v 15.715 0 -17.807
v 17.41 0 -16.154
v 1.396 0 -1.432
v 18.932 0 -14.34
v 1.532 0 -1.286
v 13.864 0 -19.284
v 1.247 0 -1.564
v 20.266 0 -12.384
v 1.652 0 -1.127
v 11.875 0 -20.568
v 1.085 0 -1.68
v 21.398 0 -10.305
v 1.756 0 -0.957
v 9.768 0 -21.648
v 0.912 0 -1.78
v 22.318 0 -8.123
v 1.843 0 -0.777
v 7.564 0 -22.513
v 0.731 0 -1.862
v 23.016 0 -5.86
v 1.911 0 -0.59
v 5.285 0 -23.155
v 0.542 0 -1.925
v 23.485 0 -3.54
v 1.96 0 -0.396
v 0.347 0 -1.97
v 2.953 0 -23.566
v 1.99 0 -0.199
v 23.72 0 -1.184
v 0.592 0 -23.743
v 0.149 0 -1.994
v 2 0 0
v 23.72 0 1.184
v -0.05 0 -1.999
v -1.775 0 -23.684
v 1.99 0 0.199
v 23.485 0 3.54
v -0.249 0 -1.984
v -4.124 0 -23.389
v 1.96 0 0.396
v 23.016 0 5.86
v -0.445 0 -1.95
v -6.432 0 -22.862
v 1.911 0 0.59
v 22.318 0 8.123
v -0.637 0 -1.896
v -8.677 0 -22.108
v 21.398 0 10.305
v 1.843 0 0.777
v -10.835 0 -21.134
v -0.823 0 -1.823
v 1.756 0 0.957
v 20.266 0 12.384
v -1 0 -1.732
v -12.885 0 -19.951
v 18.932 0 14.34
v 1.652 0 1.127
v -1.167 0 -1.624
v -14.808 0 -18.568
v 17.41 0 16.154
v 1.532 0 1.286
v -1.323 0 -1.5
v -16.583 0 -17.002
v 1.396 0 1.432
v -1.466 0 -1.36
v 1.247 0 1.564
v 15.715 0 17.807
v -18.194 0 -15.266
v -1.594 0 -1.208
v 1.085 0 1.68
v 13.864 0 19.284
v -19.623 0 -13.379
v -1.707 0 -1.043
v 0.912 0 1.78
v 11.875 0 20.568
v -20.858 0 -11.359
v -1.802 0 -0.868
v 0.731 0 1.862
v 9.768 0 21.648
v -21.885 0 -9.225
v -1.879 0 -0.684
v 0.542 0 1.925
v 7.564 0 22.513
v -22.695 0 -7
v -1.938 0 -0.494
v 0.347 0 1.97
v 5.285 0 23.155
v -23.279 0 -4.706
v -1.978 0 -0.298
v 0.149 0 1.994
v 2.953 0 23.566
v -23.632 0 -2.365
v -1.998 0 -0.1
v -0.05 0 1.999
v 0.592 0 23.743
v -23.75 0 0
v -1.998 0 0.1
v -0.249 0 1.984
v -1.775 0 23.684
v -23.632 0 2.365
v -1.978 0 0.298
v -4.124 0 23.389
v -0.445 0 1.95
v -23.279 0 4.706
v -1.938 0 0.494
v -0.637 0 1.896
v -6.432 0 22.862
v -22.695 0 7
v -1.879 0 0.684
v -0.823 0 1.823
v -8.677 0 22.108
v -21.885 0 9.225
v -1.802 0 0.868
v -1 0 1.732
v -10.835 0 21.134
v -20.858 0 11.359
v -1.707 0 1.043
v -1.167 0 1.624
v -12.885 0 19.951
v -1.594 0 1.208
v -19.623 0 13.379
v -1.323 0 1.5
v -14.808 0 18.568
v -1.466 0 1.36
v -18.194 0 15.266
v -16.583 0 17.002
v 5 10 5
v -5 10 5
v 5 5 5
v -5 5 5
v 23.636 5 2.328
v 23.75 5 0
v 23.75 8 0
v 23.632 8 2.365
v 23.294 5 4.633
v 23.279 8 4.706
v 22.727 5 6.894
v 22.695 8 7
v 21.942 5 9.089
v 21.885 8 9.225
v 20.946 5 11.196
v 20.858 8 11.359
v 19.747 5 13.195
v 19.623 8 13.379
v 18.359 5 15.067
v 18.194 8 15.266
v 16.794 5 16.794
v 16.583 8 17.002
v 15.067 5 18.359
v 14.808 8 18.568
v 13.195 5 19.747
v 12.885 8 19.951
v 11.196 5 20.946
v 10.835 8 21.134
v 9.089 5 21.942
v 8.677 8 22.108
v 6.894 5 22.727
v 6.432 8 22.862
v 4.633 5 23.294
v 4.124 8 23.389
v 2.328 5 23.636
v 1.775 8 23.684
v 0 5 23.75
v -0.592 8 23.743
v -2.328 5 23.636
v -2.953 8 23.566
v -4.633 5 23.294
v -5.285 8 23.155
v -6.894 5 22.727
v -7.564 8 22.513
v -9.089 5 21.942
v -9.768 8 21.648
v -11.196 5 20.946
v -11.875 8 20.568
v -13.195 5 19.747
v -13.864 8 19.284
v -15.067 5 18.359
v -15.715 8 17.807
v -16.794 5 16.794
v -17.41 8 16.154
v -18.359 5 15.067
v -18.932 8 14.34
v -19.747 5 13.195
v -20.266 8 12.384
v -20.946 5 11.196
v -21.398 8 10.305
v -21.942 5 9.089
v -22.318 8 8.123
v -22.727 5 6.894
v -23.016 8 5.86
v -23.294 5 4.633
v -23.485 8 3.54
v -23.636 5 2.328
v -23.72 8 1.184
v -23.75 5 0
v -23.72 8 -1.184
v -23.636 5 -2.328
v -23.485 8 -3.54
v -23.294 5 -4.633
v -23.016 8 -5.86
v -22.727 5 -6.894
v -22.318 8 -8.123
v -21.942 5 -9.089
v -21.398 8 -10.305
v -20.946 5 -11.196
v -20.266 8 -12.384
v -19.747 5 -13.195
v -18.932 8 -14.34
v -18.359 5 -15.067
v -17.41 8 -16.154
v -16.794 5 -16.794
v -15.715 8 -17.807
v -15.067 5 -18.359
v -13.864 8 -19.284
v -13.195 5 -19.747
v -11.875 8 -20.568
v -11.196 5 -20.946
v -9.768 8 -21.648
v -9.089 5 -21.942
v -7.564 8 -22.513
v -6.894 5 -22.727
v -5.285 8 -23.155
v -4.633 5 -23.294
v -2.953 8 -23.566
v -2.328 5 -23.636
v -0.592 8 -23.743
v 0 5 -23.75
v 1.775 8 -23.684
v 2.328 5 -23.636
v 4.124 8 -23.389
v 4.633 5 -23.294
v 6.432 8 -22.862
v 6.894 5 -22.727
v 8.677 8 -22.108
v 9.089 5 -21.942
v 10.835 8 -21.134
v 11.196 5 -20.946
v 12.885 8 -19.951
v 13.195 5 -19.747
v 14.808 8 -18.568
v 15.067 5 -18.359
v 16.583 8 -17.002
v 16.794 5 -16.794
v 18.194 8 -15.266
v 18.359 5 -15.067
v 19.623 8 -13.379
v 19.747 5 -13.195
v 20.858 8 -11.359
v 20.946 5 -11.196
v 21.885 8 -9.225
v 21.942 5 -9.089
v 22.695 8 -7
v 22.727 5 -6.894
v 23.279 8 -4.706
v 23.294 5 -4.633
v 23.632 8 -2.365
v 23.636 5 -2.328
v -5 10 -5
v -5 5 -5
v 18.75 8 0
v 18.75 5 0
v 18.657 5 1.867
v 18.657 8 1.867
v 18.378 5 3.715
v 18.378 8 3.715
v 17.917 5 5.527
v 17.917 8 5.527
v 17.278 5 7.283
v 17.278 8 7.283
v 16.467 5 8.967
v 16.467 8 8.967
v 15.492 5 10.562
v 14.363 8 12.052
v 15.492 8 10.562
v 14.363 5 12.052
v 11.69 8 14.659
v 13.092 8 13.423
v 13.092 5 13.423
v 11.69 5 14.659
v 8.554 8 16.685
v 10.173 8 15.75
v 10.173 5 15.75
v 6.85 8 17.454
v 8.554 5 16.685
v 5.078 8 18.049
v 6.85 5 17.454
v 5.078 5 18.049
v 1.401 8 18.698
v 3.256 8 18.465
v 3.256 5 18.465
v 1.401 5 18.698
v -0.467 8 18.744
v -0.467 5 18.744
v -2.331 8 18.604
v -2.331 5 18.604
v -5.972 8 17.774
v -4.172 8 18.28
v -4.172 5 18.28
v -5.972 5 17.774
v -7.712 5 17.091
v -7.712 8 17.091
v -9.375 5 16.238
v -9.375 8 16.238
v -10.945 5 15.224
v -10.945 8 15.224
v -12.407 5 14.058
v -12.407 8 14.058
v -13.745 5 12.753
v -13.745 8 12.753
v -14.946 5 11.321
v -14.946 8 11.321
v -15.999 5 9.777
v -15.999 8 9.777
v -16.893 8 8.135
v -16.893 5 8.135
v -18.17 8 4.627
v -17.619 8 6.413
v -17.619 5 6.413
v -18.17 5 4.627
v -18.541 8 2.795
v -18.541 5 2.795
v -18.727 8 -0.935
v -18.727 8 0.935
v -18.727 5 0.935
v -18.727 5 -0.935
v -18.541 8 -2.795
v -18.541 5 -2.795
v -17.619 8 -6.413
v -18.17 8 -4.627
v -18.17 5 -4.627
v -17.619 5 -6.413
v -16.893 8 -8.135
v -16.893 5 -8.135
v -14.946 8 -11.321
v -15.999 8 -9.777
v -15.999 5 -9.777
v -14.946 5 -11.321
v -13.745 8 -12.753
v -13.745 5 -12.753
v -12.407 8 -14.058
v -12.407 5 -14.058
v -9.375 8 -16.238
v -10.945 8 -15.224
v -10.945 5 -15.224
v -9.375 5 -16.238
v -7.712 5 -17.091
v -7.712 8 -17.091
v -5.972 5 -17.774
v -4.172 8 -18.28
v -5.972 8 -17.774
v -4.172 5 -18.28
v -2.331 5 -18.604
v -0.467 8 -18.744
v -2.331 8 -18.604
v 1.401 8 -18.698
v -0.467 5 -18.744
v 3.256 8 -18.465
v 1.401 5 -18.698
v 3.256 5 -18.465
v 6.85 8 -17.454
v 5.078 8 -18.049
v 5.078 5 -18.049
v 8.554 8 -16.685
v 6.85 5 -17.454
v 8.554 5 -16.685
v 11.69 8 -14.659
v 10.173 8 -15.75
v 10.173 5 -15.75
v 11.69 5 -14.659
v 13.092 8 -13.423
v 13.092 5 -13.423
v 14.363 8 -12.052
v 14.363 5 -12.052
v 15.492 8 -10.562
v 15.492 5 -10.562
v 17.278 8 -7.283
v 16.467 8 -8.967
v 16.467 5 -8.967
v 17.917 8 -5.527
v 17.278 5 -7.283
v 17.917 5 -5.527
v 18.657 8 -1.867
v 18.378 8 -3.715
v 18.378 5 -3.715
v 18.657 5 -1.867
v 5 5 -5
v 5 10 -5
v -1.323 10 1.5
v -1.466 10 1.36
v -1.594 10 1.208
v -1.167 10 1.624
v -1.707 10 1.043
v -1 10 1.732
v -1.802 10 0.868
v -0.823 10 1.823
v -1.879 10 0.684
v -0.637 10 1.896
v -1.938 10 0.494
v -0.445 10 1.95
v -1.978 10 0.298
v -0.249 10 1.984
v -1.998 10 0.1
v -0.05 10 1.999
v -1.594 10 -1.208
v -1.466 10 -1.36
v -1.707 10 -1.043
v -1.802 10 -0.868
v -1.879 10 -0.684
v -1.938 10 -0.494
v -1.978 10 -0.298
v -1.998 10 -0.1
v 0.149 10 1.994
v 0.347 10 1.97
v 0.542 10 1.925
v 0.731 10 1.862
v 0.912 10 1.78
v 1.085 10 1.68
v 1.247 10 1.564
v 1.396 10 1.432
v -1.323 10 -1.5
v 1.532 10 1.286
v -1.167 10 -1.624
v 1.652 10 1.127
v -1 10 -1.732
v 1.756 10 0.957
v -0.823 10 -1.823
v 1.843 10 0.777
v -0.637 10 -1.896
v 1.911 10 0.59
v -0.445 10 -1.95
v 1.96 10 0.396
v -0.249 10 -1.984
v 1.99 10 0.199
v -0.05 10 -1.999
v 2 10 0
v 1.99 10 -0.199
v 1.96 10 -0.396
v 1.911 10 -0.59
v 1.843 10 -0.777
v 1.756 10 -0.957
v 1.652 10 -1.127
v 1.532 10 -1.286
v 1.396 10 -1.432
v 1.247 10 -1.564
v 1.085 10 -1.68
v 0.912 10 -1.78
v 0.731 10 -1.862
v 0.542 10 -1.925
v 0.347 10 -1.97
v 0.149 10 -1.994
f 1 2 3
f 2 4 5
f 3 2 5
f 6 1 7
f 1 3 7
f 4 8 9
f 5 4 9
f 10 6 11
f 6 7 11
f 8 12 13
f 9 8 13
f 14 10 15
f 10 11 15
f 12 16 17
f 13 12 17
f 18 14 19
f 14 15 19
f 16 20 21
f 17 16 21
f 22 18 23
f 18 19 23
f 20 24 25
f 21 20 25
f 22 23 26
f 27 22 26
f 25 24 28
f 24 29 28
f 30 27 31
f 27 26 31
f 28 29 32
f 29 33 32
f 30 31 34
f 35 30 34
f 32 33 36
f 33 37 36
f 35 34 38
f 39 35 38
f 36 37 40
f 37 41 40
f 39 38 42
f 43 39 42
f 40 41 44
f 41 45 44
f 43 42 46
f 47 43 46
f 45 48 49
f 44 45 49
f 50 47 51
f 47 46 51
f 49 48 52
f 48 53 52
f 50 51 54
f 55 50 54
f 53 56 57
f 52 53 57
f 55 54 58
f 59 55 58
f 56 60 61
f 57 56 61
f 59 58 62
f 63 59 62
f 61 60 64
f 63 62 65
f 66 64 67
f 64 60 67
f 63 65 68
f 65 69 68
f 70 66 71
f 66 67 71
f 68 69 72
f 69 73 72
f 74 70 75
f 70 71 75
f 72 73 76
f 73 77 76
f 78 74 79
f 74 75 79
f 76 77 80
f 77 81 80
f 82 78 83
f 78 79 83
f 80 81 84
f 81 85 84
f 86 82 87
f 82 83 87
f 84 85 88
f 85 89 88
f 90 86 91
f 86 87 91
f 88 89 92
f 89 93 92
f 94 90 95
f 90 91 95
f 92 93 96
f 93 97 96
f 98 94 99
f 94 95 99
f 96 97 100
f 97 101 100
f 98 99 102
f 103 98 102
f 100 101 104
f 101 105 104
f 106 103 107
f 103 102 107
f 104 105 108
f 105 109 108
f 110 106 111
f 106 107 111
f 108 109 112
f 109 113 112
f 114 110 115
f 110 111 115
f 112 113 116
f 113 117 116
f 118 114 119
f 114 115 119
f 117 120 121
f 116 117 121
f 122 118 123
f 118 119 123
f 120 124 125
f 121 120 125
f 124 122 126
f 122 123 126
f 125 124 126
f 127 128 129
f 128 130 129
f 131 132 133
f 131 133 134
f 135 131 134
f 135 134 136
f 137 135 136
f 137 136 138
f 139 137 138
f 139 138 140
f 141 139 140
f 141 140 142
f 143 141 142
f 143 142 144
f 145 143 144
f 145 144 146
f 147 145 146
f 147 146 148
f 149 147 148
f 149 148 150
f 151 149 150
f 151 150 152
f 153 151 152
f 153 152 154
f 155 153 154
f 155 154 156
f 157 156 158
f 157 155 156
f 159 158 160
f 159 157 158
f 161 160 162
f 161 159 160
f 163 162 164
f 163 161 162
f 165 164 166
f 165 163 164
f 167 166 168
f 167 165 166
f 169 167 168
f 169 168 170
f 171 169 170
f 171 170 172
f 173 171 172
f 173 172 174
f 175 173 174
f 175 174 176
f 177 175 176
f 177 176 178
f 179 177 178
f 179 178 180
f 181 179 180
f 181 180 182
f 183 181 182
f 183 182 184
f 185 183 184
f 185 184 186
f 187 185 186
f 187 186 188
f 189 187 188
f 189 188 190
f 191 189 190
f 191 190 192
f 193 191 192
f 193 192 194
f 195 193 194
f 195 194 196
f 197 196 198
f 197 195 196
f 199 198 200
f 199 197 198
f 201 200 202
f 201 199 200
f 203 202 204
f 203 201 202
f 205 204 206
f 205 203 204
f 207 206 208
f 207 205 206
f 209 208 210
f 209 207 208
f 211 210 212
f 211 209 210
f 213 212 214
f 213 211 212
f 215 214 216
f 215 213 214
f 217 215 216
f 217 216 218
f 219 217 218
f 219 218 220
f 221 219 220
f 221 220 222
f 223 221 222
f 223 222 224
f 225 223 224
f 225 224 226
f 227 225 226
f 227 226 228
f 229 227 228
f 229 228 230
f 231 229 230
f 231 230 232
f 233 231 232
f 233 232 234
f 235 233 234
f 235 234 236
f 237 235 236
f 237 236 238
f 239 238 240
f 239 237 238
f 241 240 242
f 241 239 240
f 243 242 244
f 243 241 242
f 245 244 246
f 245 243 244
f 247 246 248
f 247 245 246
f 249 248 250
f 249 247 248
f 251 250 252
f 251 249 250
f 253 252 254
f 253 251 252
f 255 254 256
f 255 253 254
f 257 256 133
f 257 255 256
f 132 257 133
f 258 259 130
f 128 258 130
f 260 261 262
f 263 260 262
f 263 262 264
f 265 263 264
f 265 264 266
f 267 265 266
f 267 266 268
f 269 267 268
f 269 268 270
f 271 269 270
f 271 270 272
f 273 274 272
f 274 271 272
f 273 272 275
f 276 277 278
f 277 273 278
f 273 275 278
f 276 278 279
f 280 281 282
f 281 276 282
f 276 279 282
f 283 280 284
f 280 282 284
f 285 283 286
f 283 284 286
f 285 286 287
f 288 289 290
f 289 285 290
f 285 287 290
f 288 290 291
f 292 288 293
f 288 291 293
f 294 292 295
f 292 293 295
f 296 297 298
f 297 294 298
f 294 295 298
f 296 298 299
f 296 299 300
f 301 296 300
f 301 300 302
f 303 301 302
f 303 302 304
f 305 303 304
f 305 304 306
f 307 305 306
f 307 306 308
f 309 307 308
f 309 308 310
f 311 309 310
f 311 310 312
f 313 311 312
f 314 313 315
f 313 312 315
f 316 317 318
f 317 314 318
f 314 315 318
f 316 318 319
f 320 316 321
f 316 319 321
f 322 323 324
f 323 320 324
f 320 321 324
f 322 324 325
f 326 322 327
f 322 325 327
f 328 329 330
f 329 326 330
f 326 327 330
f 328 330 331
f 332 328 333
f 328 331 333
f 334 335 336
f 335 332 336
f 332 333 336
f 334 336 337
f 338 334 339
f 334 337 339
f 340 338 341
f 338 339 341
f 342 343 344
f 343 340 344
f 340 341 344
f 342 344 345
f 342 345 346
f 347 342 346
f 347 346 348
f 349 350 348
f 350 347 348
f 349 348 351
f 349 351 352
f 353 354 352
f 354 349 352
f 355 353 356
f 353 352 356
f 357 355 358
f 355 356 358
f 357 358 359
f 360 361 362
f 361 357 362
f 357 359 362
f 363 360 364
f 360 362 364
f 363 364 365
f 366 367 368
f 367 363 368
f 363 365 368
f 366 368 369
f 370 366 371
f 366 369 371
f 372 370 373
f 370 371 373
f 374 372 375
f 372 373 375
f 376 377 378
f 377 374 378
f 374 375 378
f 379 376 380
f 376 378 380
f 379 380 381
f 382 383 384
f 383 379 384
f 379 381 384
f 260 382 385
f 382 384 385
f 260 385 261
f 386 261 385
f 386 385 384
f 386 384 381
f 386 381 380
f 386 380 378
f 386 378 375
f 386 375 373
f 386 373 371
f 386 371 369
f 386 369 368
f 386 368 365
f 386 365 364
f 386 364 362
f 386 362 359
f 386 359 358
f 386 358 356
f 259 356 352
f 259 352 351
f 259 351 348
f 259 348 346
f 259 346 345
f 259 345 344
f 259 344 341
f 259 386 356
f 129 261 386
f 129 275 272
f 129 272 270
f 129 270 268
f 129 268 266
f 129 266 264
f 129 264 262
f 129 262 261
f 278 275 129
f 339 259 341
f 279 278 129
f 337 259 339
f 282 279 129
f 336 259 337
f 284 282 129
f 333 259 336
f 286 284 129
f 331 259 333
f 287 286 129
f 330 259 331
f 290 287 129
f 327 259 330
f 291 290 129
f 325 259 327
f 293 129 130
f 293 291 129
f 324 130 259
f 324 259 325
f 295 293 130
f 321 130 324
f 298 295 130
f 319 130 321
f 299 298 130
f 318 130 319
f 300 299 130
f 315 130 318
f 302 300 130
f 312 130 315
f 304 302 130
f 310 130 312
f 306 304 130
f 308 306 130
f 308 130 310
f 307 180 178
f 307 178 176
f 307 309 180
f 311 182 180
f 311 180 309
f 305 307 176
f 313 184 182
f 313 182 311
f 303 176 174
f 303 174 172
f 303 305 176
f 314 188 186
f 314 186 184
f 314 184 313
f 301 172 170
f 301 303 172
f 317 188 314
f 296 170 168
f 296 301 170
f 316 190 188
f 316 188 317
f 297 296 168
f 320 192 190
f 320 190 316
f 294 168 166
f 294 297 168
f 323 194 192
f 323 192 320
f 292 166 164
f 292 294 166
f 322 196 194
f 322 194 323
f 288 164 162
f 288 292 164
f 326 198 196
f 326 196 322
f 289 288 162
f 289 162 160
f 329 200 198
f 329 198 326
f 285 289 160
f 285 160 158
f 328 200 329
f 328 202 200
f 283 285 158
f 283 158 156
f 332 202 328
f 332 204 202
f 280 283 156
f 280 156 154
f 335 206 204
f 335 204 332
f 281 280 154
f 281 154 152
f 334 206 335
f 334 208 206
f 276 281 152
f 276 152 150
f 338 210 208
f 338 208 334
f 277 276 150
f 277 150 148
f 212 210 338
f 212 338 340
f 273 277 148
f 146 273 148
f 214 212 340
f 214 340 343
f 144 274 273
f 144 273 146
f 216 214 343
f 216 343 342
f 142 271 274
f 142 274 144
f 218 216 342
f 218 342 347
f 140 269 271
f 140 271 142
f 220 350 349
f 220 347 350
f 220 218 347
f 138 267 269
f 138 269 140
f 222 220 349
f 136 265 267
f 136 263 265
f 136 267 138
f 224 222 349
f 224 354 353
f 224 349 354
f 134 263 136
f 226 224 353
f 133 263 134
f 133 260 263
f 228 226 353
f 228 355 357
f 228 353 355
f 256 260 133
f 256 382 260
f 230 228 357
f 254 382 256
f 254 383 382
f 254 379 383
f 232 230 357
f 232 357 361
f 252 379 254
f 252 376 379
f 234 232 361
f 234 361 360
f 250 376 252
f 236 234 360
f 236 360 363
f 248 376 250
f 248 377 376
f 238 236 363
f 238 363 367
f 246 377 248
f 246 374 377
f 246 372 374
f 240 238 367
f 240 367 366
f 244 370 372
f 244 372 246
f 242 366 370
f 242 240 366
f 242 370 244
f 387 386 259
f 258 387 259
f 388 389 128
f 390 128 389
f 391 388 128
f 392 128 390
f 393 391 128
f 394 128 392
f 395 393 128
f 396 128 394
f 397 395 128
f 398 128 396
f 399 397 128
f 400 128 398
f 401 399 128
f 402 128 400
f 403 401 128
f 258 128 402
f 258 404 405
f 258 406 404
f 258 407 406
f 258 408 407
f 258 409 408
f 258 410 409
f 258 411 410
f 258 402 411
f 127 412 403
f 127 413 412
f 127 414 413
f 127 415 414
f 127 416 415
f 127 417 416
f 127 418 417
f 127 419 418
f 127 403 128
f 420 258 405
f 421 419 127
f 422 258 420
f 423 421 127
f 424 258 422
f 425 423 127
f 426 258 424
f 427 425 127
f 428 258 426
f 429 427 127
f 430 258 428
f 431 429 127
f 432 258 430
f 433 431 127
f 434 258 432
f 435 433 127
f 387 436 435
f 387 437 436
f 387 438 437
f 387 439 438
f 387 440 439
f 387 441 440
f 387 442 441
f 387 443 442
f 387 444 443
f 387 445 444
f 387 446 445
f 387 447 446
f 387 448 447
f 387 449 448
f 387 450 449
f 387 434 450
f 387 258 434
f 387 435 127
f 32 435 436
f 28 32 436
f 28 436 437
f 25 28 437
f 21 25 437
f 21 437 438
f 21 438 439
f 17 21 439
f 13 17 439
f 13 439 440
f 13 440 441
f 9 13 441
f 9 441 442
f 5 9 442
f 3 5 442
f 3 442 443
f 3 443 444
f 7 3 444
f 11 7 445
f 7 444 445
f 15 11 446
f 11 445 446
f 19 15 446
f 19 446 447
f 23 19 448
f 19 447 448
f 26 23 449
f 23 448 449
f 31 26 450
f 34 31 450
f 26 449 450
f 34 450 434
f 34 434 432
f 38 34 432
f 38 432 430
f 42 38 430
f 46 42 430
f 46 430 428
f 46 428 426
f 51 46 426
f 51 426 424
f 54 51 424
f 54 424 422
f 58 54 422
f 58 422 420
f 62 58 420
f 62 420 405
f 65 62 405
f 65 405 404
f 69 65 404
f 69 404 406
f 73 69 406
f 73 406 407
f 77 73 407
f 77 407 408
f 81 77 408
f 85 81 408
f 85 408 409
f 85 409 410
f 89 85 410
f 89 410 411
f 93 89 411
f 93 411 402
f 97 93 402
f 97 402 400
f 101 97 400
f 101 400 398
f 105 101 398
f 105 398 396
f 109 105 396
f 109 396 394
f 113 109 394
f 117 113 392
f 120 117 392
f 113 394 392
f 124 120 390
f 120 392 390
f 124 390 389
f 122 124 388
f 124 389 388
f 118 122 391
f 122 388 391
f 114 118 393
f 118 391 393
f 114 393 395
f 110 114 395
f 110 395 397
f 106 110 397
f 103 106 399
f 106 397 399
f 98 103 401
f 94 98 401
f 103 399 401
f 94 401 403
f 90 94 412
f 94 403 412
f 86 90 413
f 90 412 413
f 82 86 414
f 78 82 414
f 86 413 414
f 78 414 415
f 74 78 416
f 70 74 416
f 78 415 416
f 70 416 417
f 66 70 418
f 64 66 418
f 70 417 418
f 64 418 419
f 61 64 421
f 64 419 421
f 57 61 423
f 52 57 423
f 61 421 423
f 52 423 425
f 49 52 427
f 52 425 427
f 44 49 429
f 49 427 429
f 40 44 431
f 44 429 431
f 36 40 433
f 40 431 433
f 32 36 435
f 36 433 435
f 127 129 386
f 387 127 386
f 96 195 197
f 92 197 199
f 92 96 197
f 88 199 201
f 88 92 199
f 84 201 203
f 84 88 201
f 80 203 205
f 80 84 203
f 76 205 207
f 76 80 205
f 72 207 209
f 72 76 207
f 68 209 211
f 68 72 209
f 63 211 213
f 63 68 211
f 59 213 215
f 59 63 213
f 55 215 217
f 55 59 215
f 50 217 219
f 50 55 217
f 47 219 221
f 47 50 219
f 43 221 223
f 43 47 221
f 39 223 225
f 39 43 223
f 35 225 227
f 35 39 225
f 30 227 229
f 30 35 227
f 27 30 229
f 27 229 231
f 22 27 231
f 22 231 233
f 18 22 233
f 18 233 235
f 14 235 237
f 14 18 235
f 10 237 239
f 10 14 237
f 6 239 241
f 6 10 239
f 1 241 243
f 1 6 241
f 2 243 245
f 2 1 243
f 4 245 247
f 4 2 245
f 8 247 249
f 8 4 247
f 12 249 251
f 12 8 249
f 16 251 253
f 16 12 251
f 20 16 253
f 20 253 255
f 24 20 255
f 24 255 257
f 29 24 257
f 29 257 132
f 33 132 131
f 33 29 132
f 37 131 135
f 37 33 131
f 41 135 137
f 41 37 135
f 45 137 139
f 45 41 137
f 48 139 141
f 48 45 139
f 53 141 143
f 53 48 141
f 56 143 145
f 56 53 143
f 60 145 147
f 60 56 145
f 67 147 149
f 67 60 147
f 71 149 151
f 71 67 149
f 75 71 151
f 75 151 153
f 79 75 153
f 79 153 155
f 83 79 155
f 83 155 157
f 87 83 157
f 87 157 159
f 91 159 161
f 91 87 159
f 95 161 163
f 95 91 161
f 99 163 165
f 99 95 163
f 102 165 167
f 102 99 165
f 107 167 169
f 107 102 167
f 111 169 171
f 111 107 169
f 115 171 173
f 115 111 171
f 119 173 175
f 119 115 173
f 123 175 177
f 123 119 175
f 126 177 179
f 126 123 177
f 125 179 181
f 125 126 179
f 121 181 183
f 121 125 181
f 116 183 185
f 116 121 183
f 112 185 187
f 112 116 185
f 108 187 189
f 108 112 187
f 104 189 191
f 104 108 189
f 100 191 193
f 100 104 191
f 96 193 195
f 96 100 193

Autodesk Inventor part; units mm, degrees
ref_plane "YZ Plane" through (0, 0, 0) normal (1, 0, 0) x (0, 1, 0)
ref_plane "XZ Plane" through (0, 0, 0) normal (0, 1, 0) x (-1, 0, 0)
sketch "Sketch1" plane through (0, 0, 0) normal (0, 1, 0) x (-1, 0, 0)
  circle A0 centre (0, 0) radius 23.75
  dimension "d0" = 47.5
extrude "Extrusion1" add sketch "Sketch1" along normal blind 5
sketch "Sketch2" plane through (0, 5, 0) normal (0, 1, 0) x (1, 0, 0)
  line L0 (-5, -5) -> (5, -5)
  line L1 (5, -5) -> (5, 5)
  line L2 (5, 5) -> (-5, 5)
  line L3 (-5, 5) -> (-5, -5)
  point P0 (0, 0)
  point P1 (-5, 0)
  point P2 (0, -5)
  dimension "d3" = 10
  dimension "d4" = 10
extrude "Extrusion2" add sketch "Sketch2" along normal blind 5
sketch "Sketch3" plane through (0, 10, 0) normal (0, 1, 0) x (1, 0, 0)
  circle A0 centre (0, 0) radius 2
  dimension "d7" = 4
sketch "Sketch4" plane through (0, 5, 0) normal (0, 1, 0) x (1, 0, 0)
  circle A0 centre (0, 0) radius 18.75
  circle A1 centre (0, 0) radius 23.75 projected
  dimension "d8" = 5
extrude "Extrusion3" add sketch "Sketch4" along normal blind 3
extrude "Extrusion4" cut sketch "Sketch3" against normal up to next
ref_plane "Work Plane1" through (0, 4, 0) normal (0, 1, 0) x (1, 0, 0)
equation "\"d4\" = d3"
properties part number "wheel"
